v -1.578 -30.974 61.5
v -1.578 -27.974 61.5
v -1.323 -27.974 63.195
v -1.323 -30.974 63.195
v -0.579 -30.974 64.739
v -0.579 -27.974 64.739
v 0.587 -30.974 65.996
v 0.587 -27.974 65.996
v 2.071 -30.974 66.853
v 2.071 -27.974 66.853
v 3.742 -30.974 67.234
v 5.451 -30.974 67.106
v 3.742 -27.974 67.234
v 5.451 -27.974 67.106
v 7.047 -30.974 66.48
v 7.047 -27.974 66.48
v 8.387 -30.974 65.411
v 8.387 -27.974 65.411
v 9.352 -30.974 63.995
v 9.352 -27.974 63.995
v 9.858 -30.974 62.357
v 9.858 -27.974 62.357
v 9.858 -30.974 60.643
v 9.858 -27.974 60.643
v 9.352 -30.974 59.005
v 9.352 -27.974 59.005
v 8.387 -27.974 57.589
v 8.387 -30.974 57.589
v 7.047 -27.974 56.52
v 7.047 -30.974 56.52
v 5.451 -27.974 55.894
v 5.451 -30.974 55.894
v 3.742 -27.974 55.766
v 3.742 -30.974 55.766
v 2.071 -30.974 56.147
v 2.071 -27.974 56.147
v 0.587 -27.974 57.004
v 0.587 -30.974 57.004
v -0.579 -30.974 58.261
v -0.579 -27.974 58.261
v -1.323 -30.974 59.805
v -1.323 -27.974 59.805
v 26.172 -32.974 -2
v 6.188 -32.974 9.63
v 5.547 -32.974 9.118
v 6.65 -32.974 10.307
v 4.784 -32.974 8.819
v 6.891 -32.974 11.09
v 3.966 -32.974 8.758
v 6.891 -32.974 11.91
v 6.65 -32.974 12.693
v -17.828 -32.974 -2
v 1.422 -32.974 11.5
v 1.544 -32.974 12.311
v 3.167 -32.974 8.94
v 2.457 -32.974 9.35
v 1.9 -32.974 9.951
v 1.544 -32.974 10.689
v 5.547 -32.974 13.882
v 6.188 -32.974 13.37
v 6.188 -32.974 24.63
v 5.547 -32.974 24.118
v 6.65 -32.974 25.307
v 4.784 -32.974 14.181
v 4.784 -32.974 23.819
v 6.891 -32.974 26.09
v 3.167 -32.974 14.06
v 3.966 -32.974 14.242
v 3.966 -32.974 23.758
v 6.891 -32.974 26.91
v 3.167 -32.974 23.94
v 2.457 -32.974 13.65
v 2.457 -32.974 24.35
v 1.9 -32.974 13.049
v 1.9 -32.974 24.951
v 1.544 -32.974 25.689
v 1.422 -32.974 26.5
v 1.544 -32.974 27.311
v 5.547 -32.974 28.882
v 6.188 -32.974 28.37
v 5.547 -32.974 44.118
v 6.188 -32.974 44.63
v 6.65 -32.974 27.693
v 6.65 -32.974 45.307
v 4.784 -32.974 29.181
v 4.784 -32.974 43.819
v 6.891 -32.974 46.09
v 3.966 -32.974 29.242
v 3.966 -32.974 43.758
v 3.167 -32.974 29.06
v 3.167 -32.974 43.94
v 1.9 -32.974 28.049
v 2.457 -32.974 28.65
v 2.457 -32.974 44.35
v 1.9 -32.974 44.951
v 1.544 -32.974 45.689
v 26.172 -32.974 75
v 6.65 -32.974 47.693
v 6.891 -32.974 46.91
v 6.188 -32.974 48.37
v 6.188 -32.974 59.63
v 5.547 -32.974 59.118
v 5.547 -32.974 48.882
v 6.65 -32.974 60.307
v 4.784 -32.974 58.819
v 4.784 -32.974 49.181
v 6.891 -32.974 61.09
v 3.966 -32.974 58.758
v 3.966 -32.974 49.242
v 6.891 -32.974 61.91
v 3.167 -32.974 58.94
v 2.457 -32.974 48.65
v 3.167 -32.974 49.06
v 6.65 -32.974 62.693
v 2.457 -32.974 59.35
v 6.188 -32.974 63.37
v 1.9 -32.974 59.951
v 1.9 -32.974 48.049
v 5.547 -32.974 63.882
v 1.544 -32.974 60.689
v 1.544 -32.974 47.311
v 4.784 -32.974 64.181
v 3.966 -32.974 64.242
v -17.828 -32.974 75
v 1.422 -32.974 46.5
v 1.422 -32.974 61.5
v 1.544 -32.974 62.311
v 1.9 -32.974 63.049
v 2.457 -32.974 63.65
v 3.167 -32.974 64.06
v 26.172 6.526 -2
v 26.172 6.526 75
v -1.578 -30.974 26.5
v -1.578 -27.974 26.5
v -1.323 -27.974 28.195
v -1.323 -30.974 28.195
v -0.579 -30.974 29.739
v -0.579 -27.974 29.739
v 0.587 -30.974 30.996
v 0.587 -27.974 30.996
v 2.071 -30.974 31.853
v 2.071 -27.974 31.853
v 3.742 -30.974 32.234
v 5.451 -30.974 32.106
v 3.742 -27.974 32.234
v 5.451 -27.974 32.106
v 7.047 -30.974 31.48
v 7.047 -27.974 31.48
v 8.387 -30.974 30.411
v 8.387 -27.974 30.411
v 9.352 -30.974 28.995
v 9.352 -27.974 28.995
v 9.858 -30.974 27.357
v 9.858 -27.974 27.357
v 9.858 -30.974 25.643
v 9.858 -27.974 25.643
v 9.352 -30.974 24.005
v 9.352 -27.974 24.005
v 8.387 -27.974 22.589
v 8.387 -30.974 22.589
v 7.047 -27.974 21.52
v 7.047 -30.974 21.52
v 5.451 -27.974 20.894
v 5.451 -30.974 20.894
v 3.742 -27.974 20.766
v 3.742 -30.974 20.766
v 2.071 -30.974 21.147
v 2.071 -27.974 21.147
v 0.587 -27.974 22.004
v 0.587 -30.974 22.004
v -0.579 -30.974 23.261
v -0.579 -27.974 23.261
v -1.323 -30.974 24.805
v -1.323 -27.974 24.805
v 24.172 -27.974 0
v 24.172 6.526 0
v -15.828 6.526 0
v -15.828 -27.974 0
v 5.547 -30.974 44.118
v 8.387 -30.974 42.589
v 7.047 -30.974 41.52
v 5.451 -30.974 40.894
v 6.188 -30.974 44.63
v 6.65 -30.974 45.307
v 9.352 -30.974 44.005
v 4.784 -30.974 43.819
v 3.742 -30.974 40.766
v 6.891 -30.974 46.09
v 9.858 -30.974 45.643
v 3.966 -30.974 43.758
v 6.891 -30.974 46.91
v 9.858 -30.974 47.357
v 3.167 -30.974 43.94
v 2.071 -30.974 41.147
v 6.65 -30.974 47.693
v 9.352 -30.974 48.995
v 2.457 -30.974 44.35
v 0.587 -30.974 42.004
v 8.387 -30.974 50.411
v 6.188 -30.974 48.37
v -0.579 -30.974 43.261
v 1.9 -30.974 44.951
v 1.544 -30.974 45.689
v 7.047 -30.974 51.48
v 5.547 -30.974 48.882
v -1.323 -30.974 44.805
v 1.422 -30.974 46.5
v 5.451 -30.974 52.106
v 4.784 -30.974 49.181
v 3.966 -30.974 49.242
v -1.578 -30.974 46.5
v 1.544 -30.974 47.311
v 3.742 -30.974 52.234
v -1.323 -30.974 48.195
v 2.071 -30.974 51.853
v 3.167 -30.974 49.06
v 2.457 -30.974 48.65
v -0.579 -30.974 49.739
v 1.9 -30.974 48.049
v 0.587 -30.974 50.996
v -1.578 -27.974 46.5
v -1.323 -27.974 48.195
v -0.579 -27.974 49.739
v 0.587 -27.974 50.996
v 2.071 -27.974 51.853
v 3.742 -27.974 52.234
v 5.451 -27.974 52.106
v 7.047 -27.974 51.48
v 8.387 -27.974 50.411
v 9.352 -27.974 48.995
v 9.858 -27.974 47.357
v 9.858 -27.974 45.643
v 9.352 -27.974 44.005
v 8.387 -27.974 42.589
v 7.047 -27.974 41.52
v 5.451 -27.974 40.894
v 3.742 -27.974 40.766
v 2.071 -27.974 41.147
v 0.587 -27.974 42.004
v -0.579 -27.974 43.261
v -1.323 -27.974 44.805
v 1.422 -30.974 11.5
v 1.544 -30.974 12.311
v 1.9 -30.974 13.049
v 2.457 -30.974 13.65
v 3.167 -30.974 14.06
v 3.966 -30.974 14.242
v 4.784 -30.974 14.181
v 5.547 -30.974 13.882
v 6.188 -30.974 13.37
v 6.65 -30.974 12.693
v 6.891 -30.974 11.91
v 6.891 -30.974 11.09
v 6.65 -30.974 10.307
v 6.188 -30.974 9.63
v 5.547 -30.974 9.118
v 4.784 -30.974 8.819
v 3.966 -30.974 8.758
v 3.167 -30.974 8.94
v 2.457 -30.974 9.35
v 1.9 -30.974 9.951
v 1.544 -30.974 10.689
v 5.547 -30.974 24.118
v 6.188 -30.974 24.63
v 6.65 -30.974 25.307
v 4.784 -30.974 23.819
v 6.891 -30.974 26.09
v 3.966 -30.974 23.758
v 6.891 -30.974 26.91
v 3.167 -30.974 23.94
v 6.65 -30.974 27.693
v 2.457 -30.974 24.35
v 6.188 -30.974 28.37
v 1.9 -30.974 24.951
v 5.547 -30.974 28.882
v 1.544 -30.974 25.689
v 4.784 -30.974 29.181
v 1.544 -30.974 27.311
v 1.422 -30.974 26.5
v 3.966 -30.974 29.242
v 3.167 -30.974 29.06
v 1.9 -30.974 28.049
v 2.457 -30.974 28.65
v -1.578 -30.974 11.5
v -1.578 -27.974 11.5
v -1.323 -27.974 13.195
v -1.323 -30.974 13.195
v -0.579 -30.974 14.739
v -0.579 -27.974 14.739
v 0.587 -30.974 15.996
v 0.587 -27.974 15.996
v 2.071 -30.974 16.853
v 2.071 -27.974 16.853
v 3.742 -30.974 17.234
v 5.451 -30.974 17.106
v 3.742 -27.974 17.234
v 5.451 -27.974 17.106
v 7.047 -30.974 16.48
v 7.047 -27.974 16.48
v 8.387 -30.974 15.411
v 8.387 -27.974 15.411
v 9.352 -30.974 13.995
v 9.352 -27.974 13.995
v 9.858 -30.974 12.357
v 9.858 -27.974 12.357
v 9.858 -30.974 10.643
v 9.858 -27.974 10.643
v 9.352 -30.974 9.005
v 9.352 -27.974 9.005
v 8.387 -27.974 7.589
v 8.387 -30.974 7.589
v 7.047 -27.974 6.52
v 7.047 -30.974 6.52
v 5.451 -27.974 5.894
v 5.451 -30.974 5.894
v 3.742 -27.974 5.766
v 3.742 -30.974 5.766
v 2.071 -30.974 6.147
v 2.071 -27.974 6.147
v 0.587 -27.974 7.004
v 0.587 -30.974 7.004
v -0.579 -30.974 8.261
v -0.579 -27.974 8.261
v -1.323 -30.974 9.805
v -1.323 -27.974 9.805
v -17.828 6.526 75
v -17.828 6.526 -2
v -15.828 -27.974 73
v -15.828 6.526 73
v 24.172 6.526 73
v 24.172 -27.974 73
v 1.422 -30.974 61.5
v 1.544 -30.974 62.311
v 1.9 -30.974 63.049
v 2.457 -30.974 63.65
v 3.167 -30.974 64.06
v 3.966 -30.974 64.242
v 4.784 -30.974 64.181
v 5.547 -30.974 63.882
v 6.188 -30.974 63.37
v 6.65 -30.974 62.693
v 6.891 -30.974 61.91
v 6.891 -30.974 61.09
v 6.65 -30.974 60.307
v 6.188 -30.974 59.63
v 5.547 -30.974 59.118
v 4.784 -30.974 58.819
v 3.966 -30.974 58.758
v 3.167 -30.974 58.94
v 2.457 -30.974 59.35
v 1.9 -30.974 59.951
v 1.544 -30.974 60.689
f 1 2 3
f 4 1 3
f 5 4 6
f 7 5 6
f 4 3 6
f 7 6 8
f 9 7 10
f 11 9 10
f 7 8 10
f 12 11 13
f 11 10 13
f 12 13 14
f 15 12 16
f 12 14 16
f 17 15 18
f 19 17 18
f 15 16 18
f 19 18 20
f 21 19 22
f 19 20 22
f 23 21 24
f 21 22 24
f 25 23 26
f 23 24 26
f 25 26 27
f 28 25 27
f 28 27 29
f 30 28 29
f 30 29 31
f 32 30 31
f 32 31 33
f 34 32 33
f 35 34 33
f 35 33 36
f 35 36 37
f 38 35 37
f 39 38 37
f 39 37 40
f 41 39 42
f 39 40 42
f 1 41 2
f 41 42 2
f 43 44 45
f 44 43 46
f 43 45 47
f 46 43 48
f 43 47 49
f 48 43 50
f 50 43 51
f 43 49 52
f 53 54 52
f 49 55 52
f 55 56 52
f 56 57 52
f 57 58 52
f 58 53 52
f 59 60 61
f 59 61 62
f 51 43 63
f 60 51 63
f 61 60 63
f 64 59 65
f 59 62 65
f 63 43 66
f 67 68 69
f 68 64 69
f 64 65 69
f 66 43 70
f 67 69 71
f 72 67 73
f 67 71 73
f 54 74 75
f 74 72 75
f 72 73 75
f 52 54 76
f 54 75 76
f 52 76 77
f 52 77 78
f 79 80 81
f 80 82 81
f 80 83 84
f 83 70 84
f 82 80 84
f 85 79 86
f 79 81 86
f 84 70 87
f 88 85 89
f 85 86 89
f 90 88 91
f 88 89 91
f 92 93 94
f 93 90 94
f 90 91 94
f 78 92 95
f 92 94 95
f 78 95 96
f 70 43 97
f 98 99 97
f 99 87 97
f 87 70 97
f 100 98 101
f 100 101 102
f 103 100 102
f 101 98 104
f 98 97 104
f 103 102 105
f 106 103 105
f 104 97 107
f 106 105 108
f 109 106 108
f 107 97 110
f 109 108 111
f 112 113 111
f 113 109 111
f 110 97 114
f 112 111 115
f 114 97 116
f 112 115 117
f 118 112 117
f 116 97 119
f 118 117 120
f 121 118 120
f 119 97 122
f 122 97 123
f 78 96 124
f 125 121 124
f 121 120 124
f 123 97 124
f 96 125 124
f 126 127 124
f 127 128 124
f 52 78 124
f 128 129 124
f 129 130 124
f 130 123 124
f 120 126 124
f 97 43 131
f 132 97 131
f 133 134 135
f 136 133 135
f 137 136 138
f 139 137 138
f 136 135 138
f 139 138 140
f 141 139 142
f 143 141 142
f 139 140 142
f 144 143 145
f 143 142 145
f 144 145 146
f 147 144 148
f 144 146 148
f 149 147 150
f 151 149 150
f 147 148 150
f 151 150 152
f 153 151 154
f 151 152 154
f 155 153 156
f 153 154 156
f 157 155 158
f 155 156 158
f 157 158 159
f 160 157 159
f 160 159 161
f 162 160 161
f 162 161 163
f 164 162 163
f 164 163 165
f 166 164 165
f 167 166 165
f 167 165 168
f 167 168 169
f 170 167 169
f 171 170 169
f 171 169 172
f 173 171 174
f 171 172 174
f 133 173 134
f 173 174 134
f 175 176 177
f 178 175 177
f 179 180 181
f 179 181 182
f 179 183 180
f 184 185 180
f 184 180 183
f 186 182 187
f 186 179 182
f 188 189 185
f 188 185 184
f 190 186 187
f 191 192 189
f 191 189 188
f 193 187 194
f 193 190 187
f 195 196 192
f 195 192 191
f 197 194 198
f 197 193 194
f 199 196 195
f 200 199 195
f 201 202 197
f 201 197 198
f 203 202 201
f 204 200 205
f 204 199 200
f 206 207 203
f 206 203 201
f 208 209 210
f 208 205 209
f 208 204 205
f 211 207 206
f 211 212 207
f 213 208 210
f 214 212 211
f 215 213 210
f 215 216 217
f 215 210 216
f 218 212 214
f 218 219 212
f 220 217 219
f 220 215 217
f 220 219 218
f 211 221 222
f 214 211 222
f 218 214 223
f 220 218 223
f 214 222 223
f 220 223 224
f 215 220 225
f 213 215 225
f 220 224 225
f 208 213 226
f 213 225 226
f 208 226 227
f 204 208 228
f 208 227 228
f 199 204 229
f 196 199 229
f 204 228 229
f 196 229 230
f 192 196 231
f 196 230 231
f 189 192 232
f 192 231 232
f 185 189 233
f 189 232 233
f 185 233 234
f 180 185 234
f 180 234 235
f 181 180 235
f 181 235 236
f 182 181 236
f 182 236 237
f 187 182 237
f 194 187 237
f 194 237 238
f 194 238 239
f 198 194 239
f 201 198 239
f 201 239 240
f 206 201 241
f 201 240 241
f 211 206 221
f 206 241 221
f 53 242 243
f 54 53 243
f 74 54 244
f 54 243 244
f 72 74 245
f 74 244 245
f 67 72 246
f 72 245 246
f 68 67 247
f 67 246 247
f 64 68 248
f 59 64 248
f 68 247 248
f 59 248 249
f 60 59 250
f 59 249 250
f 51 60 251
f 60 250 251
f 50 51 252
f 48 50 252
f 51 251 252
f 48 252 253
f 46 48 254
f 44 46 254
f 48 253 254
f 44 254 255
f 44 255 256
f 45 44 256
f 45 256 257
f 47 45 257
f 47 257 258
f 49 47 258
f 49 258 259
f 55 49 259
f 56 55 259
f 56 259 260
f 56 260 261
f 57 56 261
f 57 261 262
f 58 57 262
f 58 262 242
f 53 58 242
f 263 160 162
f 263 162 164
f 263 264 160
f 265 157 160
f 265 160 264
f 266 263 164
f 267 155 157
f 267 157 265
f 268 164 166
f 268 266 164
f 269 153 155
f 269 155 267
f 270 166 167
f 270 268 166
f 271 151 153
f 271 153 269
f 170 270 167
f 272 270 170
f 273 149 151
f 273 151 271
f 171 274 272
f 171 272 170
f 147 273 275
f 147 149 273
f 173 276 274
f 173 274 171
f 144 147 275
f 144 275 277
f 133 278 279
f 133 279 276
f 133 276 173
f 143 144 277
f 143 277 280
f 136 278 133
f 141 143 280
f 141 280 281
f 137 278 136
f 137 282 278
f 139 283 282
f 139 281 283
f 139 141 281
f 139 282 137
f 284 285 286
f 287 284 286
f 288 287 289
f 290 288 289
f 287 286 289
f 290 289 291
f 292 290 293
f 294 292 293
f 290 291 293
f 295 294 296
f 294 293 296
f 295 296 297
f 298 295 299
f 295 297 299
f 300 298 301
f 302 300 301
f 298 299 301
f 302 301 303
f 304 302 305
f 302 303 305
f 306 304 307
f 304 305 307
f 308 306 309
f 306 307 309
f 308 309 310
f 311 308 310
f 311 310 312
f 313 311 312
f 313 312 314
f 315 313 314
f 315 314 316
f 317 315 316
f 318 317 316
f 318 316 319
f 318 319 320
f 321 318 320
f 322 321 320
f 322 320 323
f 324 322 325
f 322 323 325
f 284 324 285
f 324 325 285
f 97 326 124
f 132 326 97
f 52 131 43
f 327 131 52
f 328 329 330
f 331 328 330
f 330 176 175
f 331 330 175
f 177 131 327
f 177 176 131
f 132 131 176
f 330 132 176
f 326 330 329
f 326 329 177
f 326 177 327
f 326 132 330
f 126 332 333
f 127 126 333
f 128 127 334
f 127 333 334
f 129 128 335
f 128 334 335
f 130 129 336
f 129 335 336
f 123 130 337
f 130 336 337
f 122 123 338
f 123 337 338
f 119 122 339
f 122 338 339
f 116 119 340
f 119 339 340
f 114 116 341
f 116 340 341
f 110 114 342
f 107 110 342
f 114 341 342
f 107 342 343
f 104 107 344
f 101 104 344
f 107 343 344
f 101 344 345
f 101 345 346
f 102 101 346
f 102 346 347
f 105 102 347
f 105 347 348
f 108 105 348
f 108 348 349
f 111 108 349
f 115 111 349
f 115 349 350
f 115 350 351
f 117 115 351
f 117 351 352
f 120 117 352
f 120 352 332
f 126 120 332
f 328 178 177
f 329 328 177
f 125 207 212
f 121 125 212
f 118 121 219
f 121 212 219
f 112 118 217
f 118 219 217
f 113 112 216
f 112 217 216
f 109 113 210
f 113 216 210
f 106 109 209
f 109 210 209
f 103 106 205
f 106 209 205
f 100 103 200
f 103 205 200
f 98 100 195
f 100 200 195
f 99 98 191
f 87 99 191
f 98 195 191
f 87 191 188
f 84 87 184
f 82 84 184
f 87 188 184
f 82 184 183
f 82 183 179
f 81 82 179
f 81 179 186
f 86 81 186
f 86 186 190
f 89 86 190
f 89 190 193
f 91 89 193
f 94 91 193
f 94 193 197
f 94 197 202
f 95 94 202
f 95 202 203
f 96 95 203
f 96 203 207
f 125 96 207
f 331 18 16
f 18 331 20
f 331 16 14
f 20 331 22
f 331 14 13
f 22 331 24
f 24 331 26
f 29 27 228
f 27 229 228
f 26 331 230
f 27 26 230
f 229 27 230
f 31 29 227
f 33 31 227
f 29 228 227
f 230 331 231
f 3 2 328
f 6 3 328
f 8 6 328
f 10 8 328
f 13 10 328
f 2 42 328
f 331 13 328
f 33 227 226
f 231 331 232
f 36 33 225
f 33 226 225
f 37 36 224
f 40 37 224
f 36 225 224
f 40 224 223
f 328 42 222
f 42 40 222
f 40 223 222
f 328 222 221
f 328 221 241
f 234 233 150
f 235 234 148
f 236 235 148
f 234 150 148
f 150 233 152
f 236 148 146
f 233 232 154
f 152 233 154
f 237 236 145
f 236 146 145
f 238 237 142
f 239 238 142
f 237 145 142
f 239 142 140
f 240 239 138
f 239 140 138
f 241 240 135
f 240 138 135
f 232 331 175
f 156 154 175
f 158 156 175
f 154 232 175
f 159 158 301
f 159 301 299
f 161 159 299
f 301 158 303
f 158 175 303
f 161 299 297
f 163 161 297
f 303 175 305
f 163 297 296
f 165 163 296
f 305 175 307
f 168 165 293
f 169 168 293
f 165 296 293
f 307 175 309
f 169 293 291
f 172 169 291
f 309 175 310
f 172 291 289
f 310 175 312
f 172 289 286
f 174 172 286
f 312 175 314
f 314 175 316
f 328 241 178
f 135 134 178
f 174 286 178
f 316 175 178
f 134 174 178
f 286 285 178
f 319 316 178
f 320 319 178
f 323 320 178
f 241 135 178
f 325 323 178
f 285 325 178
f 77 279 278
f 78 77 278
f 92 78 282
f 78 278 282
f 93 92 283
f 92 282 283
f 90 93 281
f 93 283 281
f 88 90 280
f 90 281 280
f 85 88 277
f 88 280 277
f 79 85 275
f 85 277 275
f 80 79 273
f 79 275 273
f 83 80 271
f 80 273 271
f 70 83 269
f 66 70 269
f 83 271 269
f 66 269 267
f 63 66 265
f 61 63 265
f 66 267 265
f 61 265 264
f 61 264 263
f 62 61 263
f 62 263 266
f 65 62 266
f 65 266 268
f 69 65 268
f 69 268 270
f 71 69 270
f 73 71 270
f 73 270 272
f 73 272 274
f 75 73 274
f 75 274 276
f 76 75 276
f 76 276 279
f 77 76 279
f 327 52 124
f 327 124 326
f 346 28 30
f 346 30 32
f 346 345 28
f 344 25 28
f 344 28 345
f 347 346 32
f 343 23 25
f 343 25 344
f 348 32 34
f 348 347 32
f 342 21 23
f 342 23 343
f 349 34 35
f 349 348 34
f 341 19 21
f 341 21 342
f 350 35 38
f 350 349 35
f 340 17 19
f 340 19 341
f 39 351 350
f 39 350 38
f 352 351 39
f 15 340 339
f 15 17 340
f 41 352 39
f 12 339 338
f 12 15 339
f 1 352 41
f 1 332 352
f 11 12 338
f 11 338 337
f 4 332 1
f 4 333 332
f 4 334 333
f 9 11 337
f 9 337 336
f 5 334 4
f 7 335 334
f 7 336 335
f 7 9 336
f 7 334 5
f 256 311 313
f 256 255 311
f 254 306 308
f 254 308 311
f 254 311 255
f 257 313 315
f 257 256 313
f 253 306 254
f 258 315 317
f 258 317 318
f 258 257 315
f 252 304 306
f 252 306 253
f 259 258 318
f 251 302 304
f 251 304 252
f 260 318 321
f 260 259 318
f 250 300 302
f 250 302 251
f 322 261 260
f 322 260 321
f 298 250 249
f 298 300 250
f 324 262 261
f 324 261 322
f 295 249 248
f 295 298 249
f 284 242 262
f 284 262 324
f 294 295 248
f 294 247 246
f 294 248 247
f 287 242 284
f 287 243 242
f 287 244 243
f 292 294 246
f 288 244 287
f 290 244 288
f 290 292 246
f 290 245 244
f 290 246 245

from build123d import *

# Parameters (mm, degrees)
EXTRUDE_1_DEPTH     = 73
SKETCH_2_W          = 44
SKETCH_2_H          = 39.5
EXTRUDE_2_DEPTH     = 2
SKETCH_3_W          = 44
SKETCH_3_H          = 39.5
EXTRUDE_3_DEPTH     = 2
SKETCH_4_R          = 2.75
CUT_EXTRUDE_1_DEPTH = 10
SKETCH_5_R          = 5.75
SKETCH_5_R_2        = 2.75
CUT_EXTRUDE_2_DEPTH = 3


with BuildPart() as part:
    # 草图1 → 凸台-拉伸1 (new body)
    with BuildSketch(Plane.XY):
        Polygon((-17.828125, 6.526041667), (-17.828125, -32.973958333), (26.171875, -32.973958333), (26.171875, 6.526041667), (24.171875, 6.526041667), (24.171875, -27.973958333), (-15.828125, -27.973958333), (-15.828125, 6.526041667), align=None)
    extrude(amount=EXTRUDE_1_DEPTH)

    # 草图2 → 凸台-拉伸2 (add)
    with BuildSketch(Plane.XY.offset(73)):
        with Locations((4.171875, -13.223958333)):
            Rectangle(SKETCH_2_W, SKETCH_2_H)
    extrude(amount=EXTRUDE_2_DEPTH)

    # 草图3 → 凸台-拉伸3 (add)
    with BuildSketch(Plane(origin=(0, 0, 0), x_dir=(-1, 0, 0), z_dir=(0, 0, -1))):
        with Locations((-4.171875, -13.223958333)):
            Rectangle(SKETCH_3_W, SKETCH_3_H)
    extrude(amount=EXTRUDE_3_DEPTH)

    # 草图4 → 切除-拉伸1 (cut)
    with BuildSketch(Plane(origin=(0, -27.973958333, 0), x_dir=(1, 0, 0), z_dir=(0, 1, 0))):
        with Locations(Location((4.171875, -26.5, 0), (0, 0, 180))):
            Circle(SKETCH_4_R)
        with Locations(Location((4.171875, -46.5, 0), (0, 0, 180))):
            Circle(SKETCH_4_R)
        with Locations(Location((4.171875, -11.5, 0), (0, 0, 180))):
            Circle(SKETCH_4_R)
        with Locations(Location((4.171875, -61.5, 0), (0, 0, 180))):
            Circle(SKETCH_4_R)
    extrude(amount=-CUT_EXTRUDE_1_DEPTH, mode=Mode.SUBTRACT)

    # 草图5 → 切除-拉伸2 (cut)
    # profile 1 of 4: a face of its own
    with BuildSketch(Plane(origin=(0, -27.973958333, 0), x_dir=(1, 0, 0), z_dir=(0, 1, 0))):
        with Locations(Location((4.171875, -61.5, 0), (0, 0, 180))):
            Circle(SKETCH_5_R)
        with Locations(Location((4.171875, -61.5, 0), (0, 0, 180))):
            Circle(SKETCH_5_R_2, mode=Mode.SUBTRACT)
    # profile 2 of 4: a face of its own
    with BuildSketch(Plane(origin=(0, -27.973958333, 0), x_dir=(1, 0, 0), z_dir=(0, 1, 0))):
        with Locations(Location((4.171875, -46.5, 0), (0, 0, 180))):
            Circle(SKETCH_5_R)
        with Locations(Location((4.171875, -46.5, 0), (0, 0, 180))):
            Circle(SKETCH_5_R_2, mode=Mode.SUBTRACT)
    # profile 3 of 4: a face of its own
    with BuildSketch(Plane(origin=(0, -27.973958333, 0), x_dir=(1, 0, 0), z_dir=(0, 1, 0))):
        with Locations(Location((4.171875, -26.5, 0), (0, 0, 180))):
            Circle(SKETCH_5_R)
        with Locations(Location((4.171875, -26.5, 0), (0, 0, 180))):
            Circle(SKETCH_5_R_2, mode=Mode.SUBTRACT)
    # profile 4 of 4: a face of its own
    with BuildSketch(Plane(origin=(0, -27.973958333, 0), x_dir=(1, 0, 0), z_dir=(0, 1, 0))):
        with Locations(Location((4.171875, -11.5, 0), (0, 0, 180))):
            Circle(SKETCH_5_R)
        with Locations(Location((4.171875, -11.5, 0), (0, 0, 180))):
            Circle(SKETCH_5_R_2, mode=Mode.SUBTRACT)
    extrude(amount=-CUT_EXTRUDE_2_DEPTH, mode=Mode.SUBTRACT)


solid = part.part
